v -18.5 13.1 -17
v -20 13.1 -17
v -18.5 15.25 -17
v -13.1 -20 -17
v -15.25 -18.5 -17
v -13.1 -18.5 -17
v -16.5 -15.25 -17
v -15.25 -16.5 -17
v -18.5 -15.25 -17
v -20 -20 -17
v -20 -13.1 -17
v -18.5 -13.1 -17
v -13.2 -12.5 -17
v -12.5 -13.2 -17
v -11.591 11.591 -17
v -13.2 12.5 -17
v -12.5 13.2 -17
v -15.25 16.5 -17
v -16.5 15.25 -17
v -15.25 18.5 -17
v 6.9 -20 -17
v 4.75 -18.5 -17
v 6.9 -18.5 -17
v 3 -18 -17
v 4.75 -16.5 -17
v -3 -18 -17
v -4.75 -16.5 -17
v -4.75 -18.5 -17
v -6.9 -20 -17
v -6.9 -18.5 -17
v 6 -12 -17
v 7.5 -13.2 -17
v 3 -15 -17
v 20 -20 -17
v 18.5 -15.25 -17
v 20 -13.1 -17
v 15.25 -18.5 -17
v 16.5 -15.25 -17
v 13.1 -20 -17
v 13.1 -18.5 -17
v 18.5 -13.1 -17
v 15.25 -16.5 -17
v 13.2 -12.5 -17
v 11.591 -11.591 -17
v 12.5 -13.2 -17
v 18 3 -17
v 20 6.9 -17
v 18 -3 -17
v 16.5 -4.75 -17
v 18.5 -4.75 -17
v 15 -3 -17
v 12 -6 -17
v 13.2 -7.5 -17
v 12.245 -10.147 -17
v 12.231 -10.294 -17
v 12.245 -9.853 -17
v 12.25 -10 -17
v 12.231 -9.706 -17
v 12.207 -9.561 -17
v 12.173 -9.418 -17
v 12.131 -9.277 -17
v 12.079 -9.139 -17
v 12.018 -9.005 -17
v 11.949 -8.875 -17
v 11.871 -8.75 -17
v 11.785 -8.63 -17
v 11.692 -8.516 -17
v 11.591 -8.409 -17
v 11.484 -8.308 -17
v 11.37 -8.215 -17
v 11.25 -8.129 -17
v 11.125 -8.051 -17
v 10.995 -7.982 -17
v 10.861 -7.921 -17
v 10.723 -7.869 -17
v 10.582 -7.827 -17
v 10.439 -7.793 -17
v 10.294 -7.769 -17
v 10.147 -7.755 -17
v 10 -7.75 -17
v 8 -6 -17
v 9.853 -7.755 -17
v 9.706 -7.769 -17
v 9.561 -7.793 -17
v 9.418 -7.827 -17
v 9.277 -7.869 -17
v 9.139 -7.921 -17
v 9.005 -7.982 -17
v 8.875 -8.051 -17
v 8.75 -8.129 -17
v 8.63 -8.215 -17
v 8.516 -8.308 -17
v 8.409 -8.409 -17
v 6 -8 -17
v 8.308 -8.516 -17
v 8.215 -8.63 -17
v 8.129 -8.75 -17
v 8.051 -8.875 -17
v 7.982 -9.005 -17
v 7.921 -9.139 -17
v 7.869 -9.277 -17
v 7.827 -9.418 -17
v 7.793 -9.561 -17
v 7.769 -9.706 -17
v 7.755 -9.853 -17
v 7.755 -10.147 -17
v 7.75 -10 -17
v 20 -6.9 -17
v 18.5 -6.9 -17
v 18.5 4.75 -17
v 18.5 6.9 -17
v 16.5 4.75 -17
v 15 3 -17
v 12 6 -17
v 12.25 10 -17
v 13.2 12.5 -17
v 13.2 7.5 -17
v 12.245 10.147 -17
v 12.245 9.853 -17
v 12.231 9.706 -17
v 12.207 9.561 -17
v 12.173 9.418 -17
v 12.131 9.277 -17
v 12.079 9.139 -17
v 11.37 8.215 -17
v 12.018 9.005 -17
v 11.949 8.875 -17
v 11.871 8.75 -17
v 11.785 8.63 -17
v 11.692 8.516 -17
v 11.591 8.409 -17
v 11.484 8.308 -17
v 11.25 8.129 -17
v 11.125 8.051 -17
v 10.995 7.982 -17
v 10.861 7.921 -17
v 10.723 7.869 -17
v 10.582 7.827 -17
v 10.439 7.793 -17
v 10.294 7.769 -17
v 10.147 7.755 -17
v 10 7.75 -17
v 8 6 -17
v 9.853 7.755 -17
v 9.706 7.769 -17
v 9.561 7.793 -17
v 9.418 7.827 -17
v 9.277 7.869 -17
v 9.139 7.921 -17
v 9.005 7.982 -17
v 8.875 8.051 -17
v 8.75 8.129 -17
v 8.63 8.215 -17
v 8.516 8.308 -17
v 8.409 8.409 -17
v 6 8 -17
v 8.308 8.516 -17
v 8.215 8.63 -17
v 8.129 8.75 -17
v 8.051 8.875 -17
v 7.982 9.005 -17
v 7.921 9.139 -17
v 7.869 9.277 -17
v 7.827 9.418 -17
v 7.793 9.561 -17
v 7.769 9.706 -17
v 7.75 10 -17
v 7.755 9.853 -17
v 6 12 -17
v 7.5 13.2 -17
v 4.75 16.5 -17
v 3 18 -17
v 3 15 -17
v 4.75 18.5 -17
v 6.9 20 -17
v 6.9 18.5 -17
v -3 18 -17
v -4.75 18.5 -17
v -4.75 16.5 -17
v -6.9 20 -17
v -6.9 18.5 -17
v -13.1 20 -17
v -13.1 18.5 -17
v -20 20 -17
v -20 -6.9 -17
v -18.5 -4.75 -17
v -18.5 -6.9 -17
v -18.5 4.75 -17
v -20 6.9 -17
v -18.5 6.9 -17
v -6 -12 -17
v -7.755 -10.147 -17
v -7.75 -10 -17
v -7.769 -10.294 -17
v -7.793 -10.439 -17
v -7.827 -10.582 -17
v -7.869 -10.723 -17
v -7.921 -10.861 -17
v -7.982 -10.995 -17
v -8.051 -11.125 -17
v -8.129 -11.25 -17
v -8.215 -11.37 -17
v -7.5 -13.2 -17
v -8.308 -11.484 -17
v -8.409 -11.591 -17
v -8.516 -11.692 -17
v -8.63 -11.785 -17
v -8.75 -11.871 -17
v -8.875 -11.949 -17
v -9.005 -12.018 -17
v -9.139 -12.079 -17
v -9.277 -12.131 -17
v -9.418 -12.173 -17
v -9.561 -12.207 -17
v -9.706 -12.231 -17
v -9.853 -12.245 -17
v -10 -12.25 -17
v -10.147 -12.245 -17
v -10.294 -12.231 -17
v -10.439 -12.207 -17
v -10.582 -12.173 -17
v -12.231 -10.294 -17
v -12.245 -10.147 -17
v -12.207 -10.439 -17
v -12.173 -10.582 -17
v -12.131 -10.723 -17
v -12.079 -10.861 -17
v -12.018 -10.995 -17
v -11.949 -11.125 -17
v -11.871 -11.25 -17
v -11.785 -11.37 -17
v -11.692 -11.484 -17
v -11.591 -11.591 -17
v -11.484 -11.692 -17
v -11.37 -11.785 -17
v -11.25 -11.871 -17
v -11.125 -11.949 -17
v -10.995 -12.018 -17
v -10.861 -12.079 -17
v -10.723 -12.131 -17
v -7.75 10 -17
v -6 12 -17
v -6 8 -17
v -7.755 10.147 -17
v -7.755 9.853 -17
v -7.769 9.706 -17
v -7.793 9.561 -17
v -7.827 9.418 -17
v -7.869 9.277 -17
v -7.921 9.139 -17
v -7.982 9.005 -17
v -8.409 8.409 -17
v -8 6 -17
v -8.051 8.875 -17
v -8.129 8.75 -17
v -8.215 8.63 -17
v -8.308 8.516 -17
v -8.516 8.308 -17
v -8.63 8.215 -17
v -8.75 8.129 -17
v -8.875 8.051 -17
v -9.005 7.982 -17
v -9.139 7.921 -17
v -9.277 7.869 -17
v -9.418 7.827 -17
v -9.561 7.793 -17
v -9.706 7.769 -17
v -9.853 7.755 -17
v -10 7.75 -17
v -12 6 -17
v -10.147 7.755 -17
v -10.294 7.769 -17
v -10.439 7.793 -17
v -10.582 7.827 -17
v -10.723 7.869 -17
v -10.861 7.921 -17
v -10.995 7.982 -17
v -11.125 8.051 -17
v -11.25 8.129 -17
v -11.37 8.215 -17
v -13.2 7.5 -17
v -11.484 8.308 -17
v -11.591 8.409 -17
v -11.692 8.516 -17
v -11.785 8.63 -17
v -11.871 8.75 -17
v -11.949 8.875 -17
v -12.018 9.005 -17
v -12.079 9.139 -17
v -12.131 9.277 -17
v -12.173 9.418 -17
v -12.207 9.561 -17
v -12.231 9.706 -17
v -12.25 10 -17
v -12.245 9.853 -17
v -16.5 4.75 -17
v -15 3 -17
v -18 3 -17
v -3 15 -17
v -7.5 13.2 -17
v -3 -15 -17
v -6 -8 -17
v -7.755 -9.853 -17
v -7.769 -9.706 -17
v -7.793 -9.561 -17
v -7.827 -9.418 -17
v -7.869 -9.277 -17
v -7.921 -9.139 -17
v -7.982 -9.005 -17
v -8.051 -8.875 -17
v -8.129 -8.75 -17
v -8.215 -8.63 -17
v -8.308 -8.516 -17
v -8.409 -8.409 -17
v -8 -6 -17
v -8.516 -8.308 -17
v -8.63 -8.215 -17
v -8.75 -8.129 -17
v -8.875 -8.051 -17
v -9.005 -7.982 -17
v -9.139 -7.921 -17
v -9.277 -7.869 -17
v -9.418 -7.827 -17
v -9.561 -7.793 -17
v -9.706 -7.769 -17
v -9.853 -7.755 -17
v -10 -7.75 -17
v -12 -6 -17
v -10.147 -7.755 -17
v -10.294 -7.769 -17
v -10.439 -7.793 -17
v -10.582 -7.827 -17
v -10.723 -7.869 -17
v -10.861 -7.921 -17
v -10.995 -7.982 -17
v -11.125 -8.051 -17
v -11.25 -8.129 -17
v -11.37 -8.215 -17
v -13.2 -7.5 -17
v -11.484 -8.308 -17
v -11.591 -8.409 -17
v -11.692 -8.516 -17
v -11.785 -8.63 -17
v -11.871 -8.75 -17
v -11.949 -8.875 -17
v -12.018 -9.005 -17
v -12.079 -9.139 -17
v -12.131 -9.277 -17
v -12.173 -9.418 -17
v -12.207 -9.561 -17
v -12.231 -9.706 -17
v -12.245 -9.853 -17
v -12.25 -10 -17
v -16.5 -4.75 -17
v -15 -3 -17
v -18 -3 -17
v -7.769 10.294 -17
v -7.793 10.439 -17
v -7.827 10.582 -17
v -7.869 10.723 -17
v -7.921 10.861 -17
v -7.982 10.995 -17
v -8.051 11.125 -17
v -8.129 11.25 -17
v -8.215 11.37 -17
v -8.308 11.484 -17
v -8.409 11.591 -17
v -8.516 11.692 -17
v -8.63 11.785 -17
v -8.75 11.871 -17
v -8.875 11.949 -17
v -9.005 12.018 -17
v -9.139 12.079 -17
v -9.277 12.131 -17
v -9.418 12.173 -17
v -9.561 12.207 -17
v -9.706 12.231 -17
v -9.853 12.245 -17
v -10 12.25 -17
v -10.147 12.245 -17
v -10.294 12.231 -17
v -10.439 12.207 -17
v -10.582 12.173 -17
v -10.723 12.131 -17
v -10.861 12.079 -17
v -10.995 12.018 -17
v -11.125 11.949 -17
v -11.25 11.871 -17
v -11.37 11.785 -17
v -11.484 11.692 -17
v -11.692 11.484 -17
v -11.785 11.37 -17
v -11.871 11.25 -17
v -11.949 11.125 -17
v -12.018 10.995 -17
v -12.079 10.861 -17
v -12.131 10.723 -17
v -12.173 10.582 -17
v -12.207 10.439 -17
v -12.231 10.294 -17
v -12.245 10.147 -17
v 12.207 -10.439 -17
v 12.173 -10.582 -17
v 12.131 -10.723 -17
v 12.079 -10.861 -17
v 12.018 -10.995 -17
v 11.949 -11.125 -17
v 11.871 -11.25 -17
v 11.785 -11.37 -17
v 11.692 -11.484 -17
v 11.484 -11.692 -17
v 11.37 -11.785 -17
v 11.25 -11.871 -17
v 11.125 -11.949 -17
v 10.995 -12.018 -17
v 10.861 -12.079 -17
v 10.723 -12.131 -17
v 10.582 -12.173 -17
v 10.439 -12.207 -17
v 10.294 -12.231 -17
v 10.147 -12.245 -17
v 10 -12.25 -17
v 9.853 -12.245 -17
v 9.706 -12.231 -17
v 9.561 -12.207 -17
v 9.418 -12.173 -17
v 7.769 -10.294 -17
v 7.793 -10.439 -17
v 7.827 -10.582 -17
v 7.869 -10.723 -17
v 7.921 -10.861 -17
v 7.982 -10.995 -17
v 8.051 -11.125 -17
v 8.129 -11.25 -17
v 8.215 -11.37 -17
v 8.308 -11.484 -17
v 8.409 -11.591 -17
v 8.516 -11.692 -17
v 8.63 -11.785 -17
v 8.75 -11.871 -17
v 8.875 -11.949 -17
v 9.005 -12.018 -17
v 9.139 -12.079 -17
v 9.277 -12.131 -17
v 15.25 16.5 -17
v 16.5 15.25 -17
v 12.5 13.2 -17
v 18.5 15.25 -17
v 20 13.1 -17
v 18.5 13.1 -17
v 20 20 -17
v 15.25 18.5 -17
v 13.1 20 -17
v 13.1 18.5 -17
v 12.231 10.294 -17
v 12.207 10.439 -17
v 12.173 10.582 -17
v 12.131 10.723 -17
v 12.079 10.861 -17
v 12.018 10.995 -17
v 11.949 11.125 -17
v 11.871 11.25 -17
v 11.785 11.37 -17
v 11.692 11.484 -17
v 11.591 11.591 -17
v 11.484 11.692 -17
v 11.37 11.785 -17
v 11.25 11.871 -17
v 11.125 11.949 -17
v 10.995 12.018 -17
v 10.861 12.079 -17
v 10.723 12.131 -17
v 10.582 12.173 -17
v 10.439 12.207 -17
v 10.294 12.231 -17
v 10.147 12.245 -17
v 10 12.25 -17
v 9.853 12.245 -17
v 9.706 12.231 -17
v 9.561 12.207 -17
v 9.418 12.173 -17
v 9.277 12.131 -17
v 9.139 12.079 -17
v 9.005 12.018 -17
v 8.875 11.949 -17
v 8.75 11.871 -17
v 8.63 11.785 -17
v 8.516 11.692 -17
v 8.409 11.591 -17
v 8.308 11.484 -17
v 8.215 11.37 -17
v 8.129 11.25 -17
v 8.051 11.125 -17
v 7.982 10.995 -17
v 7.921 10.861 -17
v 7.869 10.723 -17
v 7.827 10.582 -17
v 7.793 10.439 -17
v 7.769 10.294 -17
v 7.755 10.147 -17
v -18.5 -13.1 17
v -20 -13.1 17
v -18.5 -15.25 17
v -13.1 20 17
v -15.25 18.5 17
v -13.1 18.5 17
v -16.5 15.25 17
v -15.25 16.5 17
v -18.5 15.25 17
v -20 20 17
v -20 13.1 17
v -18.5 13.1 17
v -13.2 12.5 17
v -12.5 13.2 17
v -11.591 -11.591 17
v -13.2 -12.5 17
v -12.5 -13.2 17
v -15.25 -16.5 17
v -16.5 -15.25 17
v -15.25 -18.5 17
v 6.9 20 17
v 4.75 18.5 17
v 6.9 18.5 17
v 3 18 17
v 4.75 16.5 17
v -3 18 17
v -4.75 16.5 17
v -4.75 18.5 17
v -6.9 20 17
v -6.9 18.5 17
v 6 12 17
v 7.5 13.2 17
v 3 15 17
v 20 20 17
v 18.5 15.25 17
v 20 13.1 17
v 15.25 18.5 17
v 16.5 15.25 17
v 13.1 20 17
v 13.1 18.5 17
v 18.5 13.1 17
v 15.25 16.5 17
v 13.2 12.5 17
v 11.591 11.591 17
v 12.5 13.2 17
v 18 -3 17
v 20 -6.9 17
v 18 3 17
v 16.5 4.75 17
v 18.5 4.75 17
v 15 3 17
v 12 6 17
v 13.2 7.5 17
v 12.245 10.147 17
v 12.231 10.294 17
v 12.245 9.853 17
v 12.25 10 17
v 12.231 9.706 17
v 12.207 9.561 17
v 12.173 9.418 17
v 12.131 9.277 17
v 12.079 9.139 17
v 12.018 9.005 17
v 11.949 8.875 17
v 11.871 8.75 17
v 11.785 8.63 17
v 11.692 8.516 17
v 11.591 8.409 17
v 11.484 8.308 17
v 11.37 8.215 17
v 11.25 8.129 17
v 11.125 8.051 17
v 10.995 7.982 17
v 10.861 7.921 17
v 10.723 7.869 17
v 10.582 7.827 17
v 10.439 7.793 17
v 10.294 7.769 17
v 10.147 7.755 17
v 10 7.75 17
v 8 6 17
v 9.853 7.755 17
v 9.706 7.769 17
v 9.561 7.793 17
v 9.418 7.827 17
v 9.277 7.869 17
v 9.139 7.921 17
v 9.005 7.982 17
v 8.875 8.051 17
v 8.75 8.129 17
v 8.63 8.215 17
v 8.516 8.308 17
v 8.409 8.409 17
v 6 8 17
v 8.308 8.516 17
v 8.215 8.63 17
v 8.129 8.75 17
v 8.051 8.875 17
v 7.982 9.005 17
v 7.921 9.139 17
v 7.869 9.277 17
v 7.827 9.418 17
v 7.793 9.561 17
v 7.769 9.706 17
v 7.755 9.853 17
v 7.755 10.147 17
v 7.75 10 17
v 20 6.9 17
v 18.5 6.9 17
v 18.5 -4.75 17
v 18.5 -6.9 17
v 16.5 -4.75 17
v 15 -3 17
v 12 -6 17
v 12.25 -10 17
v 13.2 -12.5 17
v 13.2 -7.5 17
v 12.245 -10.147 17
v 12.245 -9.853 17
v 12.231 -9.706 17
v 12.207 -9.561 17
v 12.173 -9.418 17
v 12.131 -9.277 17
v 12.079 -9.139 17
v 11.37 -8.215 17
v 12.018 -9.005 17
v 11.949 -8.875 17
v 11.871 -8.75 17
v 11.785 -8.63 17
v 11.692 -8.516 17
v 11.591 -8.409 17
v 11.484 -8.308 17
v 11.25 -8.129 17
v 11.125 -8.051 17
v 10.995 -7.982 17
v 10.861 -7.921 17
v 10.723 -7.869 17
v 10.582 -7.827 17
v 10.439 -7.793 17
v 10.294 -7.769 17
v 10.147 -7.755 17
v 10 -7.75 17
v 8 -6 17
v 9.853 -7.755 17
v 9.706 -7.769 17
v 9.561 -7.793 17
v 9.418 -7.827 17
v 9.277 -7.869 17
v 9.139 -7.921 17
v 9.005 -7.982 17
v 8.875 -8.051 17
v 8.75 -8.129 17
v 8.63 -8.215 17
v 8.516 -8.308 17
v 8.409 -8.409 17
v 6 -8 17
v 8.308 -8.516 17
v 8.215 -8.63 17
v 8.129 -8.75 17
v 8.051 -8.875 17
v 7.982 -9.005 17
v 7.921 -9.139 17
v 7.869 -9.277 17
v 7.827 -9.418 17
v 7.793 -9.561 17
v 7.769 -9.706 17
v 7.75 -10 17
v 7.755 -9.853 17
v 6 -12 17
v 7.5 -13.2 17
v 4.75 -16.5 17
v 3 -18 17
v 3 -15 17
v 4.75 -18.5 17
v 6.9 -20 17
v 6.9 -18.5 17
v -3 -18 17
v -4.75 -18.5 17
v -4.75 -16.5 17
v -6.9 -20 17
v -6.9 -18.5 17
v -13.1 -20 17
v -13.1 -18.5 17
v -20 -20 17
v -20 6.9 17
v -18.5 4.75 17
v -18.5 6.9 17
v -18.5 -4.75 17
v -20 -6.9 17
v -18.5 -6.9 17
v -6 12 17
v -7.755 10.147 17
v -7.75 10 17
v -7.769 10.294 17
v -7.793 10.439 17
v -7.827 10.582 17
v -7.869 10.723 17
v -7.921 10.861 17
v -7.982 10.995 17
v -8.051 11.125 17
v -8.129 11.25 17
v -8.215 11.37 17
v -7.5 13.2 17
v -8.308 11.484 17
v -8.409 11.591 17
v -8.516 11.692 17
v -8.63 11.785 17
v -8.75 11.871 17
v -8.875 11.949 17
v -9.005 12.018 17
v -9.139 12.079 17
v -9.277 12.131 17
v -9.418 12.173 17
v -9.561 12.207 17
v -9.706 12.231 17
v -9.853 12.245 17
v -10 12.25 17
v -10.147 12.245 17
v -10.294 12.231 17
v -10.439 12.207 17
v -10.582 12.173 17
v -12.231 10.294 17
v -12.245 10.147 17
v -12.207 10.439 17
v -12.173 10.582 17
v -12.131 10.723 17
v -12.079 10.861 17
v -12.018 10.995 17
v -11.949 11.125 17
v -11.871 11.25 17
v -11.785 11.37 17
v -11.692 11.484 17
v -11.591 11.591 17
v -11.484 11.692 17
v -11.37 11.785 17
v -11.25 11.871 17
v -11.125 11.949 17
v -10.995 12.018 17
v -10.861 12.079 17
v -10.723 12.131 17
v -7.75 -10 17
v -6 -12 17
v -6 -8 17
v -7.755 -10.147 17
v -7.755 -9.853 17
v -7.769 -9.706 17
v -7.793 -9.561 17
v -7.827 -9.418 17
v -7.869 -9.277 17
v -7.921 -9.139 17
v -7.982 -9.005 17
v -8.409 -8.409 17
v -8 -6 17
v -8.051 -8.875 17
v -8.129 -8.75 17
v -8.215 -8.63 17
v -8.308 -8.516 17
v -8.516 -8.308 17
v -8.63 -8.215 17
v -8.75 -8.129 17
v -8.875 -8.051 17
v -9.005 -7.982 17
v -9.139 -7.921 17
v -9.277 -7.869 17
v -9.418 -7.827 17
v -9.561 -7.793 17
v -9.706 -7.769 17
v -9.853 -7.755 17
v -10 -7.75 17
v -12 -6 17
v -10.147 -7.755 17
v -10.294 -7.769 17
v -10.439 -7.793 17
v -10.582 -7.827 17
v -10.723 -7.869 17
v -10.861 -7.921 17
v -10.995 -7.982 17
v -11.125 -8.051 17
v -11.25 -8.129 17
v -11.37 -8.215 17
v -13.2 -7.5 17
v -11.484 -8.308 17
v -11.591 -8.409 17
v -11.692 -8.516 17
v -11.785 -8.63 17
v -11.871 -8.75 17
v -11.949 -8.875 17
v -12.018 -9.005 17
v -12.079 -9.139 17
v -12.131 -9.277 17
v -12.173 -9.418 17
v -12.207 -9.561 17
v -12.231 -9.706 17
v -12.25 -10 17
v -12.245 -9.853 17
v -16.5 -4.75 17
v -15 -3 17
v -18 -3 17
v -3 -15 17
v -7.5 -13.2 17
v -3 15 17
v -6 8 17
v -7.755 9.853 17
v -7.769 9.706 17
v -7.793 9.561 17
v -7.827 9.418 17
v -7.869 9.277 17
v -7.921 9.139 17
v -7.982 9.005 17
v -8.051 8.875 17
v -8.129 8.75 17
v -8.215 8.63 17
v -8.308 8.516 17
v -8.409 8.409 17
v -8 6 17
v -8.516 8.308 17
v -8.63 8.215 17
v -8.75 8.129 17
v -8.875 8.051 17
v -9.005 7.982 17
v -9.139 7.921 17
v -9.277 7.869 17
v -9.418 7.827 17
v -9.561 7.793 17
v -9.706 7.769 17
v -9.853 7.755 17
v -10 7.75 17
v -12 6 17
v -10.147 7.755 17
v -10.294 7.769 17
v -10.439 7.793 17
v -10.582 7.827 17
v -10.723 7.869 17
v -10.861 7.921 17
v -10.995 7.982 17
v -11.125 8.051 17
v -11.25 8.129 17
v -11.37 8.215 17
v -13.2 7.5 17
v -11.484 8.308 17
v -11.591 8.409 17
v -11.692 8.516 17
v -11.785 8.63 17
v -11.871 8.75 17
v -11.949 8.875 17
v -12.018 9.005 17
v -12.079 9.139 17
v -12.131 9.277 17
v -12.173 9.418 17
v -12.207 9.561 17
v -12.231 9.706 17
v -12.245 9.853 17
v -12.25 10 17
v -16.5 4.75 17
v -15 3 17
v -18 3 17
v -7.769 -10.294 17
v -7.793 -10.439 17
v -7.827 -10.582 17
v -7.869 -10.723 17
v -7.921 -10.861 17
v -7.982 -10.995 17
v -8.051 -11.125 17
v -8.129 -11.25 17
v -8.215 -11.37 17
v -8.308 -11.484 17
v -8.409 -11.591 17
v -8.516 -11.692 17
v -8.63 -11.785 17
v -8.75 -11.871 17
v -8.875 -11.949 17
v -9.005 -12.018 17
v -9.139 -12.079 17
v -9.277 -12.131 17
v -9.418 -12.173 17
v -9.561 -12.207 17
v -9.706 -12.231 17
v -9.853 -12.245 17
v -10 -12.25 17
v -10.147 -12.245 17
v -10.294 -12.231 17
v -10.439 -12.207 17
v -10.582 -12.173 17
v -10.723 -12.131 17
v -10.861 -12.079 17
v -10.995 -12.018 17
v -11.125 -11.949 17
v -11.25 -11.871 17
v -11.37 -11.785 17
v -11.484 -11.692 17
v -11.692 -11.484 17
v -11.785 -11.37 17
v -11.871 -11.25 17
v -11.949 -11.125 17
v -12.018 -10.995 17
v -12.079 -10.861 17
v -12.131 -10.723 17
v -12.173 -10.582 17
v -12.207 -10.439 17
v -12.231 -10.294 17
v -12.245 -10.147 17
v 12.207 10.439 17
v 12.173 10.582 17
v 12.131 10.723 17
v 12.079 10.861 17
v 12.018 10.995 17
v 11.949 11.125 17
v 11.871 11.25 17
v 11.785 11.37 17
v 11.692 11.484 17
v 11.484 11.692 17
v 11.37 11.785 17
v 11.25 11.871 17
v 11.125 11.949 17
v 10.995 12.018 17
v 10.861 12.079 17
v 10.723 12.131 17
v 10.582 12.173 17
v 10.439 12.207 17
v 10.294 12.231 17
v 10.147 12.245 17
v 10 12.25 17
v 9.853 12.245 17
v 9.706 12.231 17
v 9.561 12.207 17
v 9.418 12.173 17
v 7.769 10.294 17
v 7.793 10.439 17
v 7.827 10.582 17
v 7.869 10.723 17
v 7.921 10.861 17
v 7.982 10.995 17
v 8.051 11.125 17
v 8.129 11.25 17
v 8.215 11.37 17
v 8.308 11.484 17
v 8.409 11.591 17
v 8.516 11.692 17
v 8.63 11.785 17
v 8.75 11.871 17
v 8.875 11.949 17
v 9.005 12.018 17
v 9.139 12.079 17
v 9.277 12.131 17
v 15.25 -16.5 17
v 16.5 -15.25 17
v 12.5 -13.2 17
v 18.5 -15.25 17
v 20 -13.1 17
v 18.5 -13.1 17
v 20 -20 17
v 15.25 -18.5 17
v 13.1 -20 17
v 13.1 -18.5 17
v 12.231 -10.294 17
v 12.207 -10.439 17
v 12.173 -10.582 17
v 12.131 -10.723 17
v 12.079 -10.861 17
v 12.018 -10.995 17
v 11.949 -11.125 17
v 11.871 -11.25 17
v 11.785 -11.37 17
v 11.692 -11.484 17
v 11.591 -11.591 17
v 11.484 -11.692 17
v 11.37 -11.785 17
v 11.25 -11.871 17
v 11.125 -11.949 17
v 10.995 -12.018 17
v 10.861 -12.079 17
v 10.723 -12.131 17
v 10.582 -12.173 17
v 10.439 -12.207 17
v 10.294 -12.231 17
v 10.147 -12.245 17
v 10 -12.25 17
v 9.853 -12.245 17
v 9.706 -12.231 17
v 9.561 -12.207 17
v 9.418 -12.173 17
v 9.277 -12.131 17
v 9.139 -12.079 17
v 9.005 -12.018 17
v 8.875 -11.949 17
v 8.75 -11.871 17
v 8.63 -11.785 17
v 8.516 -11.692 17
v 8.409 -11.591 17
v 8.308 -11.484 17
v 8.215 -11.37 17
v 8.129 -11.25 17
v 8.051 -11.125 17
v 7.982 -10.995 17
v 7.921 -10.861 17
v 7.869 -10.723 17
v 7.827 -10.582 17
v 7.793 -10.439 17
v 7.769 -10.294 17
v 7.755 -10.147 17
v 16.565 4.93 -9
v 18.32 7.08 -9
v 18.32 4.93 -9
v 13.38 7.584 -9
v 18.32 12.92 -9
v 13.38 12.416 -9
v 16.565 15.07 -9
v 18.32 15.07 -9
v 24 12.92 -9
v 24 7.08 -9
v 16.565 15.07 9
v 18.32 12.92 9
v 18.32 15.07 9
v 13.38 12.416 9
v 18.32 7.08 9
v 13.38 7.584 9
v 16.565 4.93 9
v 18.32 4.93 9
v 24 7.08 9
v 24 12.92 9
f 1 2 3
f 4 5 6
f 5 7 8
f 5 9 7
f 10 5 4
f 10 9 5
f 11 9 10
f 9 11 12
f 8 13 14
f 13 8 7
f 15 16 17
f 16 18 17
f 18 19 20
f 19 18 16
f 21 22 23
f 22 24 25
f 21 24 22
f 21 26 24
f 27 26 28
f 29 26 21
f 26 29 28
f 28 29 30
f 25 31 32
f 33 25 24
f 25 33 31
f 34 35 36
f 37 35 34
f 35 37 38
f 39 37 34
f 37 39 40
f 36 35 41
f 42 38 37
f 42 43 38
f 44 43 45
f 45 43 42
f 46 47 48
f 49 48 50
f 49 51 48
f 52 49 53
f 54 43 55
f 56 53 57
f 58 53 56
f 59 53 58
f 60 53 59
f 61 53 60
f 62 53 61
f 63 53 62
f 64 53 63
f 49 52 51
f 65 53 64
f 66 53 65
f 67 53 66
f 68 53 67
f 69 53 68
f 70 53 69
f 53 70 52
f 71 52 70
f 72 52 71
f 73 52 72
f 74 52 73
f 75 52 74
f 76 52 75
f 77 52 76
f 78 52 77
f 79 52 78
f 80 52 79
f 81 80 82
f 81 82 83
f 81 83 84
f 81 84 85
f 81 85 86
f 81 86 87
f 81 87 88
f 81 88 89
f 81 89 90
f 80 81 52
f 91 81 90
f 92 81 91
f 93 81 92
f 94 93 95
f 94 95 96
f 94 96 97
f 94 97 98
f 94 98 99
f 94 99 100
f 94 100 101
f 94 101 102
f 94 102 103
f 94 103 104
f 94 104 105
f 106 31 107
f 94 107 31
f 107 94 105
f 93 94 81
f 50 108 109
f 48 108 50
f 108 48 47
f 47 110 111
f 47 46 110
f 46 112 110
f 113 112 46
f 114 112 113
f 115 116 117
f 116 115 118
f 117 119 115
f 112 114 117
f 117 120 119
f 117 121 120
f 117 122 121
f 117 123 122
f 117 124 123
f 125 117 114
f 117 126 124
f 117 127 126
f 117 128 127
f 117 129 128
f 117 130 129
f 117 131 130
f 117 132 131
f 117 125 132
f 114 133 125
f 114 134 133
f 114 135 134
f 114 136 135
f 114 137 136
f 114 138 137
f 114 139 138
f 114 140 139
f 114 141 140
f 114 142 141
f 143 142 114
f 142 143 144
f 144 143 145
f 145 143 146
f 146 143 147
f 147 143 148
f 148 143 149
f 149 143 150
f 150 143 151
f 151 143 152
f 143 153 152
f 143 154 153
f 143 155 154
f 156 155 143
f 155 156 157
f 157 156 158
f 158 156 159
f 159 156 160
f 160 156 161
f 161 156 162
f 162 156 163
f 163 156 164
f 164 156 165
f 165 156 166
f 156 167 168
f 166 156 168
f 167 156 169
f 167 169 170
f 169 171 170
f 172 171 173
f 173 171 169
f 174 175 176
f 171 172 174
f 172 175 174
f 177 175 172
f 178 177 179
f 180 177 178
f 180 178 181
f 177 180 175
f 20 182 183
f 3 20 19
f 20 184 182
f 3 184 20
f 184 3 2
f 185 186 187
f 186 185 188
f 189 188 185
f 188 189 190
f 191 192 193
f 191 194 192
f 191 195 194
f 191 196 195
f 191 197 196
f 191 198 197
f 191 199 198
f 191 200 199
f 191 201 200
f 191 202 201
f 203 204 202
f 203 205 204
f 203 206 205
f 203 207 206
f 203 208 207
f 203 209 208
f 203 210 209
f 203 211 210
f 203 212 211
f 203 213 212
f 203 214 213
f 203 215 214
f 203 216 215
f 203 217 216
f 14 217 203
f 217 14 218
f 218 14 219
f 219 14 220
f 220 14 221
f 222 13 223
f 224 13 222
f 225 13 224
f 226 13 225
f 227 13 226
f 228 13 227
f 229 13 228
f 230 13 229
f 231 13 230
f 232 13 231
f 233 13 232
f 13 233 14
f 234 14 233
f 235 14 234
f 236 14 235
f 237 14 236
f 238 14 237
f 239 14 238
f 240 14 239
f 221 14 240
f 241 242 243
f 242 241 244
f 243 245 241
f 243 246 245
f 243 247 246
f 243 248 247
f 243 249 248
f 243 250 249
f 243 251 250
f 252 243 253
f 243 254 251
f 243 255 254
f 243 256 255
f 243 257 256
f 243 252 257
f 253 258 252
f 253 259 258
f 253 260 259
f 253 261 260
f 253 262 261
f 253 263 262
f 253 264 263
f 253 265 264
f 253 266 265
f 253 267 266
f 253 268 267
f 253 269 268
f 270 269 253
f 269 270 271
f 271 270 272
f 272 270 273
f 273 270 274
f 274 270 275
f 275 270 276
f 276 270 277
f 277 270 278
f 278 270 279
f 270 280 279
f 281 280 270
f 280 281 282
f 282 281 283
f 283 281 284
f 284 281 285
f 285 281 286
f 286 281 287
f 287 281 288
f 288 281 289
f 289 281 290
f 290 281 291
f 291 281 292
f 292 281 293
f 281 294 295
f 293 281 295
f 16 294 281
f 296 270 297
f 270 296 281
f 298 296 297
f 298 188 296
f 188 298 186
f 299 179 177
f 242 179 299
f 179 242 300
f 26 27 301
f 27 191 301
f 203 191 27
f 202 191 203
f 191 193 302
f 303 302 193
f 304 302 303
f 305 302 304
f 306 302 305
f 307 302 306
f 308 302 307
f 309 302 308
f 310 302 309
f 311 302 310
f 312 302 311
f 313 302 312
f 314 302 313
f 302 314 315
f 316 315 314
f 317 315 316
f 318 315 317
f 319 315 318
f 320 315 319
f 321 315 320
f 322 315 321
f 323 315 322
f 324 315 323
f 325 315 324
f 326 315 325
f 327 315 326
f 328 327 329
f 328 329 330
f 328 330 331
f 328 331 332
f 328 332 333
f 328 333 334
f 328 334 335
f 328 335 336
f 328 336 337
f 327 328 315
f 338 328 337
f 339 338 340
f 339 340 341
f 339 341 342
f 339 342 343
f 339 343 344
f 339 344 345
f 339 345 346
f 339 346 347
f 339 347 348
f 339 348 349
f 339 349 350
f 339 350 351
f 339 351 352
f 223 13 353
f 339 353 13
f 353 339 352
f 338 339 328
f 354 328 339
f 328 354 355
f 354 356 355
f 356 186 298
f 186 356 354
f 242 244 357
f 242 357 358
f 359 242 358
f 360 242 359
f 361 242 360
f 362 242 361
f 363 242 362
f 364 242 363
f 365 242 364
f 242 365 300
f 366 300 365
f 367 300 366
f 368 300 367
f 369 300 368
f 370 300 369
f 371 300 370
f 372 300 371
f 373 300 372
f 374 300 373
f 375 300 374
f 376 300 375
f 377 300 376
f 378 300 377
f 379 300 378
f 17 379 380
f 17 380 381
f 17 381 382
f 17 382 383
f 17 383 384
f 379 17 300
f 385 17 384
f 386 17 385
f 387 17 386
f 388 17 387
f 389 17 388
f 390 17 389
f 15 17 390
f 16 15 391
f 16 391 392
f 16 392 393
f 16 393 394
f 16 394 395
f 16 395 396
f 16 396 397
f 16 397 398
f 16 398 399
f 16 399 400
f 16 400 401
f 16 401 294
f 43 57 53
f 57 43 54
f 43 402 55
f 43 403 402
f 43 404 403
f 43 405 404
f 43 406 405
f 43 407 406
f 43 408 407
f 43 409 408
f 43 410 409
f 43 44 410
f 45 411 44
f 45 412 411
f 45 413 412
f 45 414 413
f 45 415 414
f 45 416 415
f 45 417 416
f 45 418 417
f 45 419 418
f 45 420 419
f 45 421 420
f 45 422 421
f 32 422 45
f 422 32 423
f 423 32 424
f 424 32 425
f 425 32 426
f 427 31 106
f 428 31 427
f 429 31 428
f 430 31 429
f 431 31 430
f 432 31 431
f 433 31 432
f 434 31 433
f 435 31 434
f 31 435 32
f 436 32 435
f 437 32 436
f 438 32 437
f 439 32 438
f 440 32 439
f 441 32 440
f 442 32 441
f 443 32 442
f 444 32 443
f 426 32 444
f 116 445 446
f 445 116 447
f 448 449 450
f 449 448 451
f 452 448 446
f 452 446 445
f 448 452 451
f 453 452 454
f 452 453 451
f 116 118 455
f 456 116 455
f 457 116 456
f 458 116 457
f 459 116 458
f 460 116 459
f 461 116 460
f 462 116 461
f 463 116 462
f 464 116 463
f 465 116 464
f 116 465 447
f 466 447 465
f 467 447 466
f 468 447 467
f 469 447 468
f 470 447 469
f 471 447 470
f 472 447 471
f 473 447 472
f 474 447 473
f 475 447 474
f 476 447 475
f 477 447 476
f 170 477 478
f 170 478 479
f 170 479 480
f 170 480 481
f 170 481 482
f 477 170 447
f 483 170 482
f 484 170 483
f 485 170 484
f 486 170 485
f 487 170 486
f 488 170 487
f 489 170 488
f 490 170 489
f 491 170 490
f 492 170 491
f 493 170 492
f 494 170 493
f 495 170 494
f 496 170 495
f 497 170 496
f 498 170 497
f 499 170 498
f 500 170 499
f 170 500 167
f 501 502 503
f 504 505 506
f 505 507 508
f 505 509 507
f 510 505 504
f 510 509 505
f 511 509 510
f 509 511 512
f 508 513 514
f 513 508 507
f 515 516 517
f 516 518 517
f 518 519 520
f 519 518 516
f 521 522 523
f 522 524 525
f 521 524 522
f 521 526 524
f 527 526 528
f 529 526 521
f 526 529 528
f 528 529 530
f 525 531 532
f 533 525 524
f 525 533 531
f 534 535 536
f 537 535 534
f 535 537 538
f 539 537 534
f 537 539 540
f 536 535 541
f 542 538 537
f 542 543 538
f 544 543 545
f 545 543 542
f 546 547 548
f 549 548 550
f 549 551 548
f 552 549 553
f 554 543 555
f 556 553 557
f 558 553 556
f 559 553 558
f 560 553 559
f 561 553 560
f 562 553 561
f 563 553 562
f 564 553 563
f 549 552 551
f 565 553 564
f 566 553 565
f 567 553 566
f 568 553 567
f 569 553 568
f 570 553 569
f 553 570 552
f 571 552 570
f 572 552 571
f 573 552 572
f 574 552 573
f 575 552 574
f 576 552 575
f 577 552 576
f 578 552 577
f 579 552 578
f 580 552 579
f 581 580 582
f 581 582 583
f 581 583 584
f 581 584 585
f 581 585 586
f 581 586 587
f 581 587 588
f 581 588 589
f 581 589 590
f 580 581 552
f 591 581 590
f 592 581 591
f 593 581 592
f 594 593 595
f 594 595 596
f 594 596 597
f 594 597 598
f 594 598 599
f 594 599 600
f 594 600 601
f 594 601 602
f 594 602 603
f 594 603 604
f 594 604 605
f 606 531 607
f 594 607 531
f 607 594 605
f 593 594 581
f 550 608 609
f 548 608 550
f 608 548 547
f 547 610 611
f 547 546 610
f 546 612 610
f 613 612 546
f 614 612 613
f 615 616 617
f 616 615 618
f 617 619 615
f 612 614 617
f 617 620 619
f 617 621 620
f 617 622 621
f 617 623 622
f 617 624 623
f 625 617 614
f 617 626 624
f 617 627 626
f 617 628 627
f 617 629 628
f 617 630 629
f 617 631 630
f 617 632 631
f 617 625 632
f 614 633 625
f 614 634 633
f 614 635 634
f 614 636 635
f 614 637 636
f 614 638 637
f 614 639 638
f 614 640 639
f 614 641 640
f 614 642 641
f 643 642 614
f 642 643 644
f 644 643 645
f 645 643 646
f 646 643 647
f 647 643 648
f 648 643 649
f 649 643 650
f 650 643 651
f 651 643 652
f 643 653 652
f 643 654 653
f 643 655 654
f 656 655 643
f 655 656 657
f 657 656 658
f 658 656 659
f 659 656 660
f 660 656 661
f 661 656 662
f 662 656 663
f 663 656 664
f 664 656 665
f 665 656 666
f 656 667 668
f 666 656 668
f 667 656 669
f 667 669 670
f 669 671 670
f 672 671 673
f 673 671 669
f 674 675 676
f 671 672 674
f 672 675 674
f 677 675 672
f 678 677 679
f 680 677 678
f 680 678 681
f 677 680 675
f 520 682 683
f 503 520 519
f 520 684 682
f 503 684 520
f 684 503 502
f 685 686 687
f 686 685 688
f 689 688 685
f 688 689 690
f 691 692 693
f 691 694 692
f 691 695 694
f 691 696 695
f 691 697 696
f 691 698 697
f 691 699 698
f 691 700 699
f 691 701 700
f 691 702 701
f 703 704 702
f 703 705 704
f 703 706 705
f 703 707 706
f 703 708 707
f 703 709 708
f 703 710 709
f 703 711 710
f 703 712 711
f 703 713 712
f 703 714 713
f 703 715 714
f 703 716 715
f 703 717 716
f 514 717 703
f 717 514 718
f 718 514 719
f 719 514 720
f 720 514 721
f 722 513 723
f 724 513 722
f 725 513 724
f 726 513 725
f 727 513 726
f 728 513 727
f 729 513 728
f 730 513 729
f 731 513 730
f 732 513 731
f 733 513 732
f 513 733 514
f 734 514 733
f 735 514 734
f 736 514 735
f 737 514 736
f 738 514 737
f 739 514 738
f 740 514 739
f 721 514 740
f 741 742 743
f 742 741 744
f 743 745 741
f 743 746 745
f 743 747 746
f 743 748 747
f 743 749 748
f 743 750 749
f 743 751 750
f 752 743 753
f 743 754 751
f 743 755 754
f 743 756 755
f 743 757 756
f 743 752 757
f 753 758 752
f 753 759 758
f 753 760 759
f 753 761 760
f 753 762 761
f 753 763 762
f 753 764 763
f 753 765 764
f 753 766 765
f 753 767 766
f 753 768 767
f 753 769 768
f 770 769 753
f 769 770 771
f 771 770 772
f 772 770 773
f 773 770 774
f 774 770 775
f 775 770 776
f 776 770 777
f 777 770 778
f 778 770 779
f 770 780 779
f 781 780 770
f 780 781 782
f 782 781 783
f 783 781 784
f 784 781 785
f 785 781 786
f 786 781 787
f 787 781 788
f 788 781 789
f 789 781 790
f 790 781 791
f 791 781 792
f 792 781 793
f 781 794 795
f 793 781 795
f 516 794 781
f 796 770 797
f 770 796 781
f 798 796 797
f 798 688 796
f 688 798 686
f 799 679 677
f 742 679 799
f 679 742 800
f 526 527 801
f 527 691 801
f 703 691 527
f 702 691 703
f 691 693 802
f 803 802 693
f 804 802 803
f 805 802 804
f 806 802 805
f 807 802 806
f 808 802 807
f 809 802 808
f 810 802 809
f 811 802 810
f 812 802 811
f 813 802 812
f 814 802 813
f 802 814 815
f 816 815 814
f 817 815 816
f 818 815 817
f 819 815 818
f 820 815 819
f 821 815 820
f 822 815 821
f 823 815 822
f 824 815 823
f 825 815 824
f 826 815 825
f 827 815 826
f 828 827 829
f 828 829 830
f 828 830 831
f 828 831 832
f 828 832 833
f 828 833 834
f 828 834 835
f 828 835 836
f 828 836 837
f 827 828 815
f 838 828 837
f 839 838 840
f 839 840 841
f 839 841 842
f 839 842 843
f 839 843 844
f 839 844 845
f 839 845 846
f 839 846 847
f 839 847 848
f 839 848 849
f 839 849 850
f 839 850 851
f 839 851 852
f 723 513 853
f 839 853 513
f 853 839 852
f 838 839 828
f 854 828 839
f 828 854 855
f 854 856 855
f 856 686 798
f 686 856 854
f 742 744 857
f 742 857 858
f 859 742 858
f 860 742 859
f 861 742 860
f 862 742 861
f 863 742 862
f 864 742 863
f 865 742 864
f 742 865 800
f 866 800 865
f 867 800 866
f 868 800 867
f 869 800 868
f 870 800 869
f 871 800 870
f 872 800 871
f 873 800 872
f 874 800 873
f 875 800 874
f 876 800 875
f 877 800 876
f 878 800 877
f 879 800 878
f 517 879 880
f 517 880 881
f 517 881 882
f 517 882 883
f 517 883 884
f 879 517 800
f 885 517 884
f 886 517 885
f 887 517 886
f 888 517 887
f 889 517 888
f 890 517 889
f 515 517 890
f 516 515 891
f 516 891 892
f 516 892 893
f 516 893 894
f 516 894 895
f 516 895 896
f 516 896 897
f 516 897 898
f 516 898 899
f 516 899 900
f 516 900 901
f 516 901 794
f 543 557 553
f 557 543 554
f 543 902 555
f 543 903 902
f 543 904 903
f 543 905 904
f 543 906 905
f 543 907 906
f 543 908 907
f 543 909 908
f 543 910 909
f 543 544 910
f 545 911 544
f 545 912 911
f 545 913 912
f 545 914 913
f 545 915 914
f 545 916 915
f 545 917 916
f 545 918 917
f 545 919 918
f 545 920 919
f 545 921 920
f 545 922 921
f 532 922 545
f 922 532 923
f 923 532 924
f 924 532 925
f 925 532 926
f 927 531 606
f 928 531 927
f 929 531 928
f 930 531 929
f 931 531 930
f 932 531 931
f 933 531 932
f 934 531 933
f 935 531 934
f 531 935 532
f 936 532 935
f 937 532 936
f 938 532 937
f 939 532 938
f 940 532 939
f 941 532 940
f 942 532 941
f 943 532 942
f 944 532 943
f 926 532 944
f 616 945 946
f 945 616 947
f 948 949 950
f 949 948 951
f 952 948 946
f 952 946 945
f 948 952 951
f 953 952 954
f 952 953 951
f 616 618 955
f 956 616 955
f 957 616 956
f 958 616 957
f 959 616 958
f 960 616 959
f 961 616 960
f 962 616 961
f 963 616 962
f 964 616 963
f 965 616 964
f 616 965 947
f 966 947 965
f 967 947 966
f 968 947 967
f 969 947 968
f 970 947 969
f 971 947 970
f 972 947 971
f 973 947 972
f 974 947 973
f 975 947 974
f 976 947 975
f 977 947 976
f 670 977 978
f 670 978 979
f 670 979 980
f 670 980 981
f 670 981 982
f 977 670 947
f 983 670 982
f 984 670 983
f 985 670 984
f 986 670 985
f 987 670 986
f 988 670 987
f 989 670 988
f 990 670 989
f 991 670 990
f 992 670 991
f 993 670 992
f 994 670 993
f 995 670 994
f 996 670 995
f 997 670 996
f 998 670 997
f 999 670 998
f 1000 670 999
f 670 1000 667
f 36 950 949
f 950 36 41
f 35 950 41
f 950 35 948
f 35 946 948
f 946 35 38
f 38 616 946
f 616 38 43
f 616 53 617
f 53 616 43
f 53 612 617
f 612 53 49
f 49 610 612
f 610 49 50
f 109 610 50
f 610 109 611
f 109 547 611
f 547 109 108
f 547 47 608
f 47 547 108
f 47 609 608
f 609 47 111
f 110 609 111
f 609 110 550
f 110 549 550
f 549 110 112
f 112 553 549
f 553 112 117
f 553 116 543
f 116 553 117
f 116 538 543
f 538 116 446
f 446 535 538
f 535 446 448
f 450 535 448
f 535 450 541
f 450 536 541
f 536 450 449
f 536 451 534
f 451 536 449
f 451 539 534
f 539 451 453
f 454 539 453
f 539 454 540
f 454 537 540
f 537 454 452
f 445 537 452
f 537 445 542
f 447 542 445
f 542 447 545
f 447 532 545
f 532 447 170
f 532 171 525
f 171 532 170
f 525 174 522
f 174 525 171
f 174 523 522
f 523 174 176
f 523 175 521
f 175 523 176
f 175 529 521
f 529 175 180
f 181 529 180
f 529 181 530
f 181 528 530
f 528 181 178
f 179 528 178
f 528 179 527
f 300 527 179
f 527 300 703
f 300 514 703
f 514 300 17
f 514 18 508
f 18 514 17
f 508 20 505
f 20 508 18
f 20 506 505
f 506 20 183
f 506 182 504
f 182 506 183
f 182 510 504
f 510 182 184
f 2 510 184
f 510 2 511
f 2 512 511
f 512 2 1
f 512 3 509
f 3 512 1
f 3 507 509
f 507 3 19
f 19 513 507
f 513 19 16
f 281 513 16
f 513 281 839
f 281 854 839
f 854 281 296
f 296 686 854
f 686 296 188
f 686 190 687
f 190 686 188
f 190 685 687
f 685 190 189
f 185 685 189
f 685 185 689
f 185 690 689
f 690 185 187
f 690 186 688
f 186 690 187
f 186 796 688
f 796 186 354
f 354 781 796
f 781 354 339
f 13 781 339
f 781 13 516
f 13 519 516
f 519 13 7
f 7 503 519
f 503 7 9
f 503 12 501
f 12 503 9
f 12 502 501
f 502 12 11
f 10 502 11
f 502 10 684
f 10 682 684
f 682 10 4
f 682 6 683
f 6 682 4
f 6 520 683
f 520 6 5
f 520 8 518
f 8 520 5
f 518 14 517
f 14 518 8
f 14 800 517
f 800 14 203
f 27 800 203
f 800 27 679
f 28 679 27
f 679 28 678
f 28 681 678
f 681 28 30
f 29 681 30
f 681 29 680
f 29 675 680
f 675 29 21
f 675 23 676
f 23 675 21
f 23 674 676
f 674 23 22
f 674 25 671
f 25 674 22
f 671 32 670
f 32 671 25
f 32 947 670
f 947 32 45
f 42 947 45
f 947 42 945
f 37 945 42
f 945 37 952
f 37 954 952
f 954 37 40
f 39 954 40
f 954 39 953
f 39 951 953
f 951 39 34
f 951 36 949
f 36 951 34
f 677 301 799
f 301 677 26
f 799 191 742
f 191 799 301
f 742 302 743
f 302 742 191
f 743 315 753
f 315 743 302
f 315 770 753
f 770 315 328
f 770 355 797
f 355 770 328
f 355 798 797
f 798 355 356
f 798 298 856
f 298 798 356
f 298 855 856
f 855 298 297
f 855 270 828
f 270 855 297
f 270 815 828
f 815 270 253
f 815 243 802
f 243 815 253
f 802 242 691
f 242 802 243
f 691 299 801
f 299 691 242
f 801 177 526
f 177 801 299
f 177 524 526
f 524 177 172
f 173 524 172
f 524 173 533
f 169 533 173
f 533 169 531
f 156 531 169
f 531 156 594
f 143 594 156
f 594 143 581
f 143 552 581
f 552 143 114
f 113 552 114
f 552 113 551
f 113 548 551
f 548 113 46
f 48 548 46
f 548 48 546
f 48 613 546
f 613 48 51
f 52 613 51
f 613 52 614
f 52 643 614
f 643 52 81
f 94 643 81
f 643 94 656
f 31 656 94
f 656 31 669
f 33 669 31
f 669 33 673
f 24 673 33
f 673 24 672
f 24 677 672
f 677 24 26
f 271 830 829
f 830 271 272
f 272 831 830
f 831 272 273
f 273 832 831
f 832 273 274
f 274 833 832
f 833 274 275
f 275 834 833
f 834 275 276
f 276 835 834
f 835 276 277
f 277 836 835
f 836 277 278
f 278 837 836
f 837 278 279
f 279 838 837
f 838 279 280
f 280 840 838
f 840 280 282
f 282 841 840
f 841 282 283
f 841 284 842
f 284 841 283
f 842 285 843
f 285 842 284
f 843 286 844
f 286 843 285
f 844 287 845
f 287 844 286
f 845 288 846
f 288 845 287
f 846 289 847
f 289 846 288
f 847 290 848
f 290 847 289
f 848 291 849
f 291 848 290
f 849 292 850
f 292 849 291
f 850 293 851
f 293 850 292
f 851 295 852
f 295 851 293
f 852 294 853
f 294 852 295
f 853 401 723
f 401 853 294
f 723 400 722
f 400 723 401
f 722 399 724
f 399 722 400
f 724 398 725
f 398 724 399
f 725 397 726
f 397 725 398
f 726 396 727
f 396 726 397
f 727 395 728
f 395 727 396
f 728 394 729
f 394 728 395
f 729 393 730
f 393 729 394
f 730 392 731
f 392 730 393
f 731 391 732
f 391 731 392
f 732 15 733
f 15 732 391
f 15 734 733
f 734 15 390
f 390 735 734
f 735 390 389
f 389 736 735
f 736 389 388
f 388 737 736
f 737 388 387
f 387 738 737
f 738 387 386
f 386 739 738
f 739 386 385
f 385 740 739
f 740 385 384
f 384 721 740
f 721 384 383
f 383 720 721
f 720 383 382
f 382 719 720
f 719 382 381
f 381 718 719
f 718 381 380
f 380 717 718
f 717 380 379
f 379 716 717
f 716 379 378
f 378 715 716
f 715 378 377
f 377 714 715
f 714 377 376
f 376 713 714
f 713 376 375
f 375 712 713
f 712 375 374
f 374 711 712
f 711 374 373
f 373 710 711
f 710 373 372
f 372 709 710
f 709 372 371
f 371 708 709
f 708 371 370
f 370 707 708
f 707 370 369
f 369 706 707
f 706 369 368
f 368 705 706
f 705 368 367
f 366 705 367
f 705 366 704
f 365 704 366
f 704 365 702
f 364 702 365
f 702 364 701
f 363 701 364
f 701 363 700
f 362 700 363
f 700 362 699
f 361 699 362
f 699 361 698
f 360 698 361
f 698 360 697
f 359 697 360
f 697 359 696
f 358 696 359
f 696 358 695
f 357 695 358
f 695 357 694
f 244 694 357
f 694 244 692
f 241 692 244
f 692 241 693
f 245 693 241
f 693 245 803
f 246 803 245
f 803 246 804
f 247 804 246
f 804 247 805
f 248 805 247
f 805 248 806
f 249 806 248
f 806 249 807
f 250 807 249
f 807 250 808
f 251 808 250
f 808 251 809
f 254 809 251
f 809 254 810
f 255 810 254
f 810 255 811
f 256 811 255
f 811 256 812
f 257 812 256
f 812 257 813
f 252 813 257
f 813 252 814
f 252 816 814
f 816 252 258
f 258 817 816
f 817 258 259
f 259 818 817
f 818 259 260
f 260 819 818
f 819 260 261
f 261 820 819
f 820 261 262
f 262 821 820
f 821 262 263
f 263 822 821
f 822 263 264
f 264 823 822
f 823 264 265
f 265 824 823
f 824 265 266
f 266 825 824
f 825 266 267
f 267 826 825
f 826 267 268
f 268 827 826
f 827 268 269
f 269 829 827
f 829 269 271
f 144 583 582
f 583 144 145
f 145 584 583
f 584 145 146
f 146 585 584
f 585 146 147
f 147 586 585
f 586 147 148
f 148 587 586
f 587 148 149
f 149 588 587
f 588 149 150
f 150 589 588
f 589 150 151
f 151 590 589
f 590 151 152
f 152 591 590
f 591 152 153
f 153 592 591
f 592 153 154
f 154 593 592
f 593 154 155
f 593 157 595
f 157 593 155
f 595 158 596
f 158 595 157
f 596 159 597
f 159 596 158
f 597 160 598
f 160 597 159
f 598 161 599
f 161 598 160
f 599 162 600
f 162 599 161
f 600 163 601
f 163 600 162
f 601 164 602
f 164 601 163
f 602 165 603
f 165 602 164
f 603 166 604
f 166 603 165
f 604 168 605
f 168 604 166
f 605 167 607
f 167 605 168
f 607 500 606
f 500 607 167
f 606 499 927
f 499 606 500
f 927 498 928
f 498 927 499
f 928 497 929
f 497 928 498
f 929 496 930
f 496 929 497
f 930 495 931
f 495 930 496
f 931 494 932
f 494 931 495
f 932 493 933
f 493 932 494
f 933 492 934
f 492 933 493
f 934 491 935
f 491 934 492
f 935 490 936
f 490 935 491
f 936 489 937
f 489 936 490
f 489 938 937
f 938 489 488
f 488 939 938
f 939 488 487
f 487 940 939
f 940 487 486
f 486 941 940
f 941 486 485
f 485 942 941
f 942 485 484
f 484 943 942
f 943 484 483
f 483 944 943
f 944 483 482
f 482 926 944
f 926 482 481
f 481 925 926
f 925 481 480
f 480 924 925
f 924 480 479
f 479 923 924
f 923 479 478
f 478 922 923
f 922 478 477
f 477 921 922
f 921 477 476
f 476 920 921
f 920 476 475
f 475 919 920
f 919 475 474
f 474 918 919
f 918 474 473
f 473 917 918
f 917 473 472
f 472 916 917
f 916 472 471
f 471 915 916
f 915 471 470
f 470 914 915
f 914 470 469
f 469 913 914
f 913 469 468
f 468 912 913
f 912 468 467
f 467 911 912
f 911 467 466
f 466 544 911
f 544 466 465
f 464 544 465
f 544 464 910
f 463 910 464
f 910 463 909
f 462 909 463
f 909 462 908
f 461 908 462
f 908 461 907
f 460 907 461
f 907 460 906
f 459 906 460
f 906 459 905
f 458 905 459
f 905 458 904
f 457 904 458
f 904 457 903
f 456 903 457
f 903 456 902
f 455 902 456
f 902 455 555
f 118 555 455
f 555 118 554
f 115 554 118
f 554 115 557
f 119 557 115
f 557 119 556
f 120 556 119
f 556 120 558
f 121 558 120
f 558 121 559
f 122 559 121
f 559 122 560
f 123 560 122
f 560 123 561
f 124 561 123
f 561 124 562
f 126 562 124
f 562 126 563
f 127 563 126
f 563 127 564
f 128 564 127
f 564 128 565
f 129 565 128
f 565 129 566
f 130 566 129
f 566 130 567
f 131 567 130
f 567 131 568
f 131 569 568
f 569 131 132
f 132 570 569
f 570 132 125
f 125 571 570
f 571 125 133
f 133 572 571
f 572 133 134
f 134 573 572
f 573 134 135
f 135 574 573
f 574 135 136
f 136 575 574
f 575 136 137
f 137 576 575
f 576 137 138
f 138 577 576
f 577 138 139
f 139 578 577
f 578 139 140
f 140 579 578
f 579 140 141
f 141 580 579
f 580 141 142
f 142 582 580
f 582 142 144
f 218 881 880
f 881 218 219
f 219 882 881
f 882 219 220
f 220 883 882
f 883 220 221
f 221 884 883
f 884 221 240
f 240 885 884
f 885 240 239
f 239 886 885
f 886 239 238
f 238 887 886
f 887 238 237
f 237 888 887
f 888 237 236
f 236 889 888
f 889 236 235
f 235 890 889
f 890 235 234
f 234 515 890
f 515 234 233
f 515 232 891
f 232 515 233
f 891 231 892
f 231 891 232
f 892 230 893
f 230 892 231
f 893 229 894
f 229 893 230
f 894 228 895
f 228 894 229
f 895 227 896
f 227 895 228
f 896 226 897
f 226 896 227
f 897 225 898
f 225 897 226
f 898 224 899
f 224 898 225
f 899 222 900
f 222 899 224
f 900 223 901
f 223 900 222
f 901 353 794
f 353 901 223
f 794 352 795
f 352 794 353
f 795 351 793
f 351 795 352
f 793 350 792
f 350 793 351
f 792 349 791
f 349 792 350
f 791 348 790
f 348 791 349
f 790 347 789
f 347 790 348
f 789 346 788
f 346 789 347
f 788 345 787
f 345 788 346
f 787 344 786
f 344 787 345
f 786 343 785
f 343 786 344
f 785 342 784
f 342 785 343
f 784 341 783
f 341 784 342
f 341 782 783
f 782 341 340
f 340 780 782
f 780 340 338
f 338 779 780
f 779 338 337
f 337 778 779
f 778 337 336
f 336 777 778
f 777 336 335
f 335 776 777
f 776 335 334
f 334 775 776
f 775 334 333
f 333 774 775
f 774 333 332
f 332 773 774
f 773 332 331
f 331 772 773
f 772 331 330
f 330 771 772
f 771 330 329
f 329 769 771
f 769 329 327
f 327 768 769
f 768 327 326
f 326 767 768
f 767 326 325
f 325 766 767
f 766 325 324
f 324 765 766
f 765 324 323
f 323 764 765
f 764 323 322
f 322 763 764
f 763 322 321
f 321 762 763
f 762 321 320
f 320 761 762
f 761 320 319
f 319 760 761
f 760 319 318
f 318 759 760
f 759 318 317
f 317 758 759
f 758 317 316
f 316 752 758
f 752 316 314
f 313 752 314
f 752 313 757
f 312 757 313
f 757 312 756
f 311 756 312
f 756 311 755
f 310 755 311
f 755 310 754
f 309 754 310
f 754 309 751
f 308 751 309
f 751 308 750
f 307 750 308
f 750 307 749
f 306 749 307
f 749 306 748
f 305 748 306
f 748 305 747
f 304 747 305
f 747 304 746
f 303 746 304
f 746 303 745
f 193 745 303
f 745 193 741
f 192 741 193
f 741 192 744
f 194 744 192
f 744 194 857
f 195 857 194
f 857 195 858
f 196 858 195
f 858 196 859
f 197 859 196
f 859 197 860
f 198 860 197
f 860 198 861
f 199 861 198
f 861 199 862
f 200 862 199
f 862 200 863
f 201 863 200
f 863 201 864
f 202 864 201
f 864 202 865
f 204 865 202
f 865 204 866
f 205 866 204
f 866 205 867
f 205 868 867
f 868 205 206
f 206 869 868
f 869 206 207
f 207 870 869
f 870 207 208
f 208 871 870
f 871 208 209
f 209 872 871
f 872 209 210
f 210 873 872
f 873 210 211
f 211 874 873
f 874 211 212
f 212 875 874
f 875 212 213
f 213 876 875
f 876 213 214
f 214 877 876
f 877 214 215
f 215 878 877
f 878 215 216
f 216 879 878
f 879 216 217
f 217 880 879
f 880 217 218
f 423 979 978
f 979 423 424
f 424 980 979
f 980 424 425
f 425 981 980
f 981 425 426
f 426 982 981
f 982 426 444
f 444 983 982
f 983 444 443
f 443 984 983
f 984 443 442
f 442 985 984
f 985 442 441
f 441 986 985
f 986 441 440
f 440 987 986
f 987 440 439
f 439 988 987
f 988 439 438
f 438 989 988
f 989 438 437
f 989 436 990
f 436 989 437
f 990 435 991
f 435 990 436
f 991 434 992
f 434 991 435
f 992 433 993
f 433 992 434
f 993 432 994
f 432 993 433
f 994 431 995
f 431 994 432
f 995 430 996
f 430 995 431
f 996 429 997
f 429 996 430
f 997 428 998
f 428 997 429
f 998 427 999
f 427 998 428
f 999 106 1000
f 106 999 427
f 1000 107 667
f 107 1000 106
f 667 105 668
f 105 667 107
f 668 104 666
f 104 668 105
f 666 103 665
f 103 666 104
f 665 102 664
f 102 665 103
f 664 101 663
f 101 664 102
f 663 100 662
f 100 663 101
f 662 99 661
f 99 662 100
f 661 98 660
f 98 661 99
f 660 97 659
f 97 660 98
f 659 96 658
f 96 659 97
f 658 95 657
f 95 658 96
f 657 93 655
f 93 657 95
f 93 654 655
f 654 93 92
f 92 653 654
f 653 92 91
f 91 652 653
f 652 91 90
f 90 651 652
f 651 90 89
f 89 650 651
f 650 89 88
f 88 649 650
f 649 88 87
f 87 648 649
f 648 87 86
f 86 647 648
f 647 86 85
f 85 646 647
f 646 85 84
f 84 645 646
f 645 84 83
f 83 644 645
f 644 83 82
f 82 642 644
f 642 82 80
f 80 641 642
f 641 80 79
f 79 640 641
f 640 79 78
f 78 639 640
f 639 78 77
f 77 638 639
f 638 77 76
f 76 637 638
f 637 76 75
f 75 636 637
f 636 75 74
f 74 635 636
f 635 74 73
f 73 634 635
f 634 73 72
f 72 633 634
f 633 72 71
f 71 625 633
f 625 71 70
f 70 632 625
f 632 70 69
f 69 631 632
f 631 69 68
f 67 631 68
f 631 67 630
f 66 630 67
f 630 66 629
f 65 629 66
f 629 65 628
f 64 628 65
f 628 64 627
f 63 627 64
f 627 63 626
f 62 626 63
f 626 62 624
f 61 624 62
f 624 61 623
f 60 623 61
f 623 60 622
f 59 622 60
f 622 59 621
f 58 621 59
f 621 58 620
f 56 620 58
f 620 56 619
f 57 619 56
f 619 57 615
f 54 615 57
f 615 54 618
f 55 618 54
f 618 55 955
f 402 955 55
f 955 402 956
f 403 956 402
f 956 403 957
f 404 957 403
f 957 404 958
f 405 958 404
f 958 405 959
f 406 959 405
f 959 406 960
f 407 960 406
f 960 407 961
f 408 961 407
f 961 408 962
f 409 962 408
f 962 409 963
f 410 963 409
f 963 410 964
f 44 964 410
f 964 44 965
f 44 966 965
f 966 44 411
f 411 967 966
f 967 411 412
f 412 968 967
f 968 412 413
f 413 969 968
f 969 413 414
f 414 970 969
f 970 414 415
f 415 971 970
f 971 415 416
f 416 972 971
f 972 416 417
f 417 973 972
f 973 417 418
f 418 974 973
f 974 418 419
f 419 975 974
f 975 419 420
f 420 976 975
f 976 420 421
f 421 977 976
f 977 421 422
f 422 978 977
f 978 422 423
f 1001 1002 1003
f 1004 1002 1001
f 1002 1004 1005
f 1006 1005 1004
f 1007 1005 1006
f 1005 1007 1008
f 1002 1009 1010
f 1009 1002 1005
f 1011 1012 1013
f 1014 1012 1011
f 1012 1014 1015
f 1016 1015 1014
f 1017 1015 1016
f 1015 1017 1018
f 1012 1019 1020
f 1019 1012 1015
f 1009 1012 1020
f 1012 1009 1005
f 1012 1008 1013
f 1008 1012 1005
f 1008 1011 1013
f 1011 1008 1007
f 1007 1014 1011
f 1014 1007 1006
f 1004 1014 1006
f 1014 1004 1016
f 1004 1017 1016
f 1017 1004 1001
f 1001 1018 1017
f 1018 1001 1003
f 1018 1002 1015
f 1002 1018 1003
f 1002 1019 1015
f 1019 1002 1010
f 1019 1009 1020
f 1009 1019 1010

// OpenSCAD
// /cad/tslot/tslot_4040_interface.scad
// V3: right-hand outside-facing 4040 dual-slot reference + retained sliding key.
// Geometry is PARAMETRIC and PHOTO-DERIVED; NOT manufacturer-certified.
// File is self-contained. No BOSL2 or external library dependencies.
//
// Coordinate system: extrusion section XY, rail travel Z.
// RIGHT face lies at X=+20. Right-upper slot is centered at Y=+10.
// Local slot coordinate U is INWARD from that face (global X = 20-U).
// Local V is perpendicular to U, across the slot (global Y = 10-V).
// There are TWO 20-mm-pitch slots per face of the 40x40 body.
$fn = 96;

view = "assembly"; // assembly, section, exploded, key, rail, interference, void, key_section, rail_section

profile_size = 40;
slot_pitch = 20;
rail_length = 34;
key_length = 18;

// All dimensions in millimeters. PHOTO-DERIVED, not officially verified.
slot_mouth = 6.20;      // exterior throat, V opening
slot_head_height = 10.50;// widest region behind retaining lip
slot_inner_flat = 5.00; // rear vertical flat at deepest slot wall
slot_depth = 6.80;      // inward reach from exterior face
lip_depth = 1.50;       // U-depth of narrow mouth before step into undercut
head_flat_end = 3.50;   // U coordinate at start of rear chamfer

// Independent interface parameters:
slide_clearance = 0.18; // offset PER SURFACE on the male head
stem_protrusion = 4;    // outboard mounting tongue extends beyond face
stem_extra_overlap = 0.60;

// Reference-fixture-only dimensions (NOT verified production extrusion values):
core_hole_diameter = 4.5;
// Central void topology approximated from the photo (not verified to print).

assert(profile_size == 40 && slot_pitch==20,
       "This layout is specifically a 40x40 dual-20-mm-pitch section");
assert(slot_mouth > 0 && slot_head_height > slot_mouth);
assert(slot_inner_flat > 0 && slot_inner_flat < slot_head_height);
assert(slot_depth > head_flat_end && head_flat_end > lip_depth && lip_depth > 0);
assert(slide_clearance >= 0 && slide_clearance < min(lip_depth/2,slot_mouth/4));
assert(key_length < rail_length);

// The void has a REAL mechanical undercut: narrow opening from U=0 to
// U=lip_depth, wider chamber immediately behind lips, then CHAMFERED BACK WALL.
// Extend void 2 mm outside the metal so it cuts a continuous side opening.
function slot_void_vertices(overcut=2) = [
    [-overcut, -slot_mouth/2],
    [lip_depth, -slot_mouth/2],
    [lip_depth, -slot_head_height/2],
    [head_flat_end, -slot_head_height/2],
    [slot_depth, -slot_inner_flat/2],
    [slot_depth,  slot_inner_flat/2],
    [head_flat_end,  slot_head_height/2],
    [lip_depth,  slot_head_height/2],
    [lip_depth,  slot_mouth/2],
    [-overcut, slot_mouth/2]
];

module slot_void_local_2d(overcut=2) {
    polygon(slot_void_vertices(overcut));
}

module cavity_inside_local_2d() {
    intersection() {
        slot_void_local_2d(overcut=0);
        translate([0, -slot_head_height])
            square([slot_depth, 2*slot_head_height]);
    }
}

// Orientation intentionally explicit. Each slot opens OUTWARD on a side face.
module at_slot(face="right", position=10) {
    if(face == "right")
        translate([ profile_size/2, position]) rotate(180) children();
    else if(face == "left")
        translate([-profile_size/2, position]) children();
    else if(face == "top")
        translate([position, profile_size/2]) rotate(-90) children();
    else if(face == "bottom")
        translate([position, -profile_size/2]) rotate(90) children();
    else assert(false, "Invalid face");
}

// Full 40x40 reference section: 8 T-slots + 4 bores + central space.
// Only the SLOT CAVITY is parameterized from the photographed measurements;
// core holes / central diamond are deliberately reference-fixture approximations.
// Photo-inspired CENTRAL void. The thin closed exterior walls, broad cross,
// and four bores mimic the supplied photograph, but are NOT tolerance data.
module core_cross_void_2d() {
    polygon([
      [-3,18],[3,18],[3,15],[6,12],[6,8],
      [8,6],[12,6],[15,3],[18,3],
      [18,-3],[15,-3],[12,-6],[8,-6],[6,-8],[6,-12],
      [3,-15],[3,-18],[-3,-18],[-3,-15],[-6,-12],
      [-6,-8],[-8,-6],[-12,-6],[-15,-3],[-18,-3],
      [-18,3],[-15,3],[-12,6],[-8,6],[-6,8],[-6,12],[-3,15]
    ]);
}

module extrusion_4040_section_2d() {
    difference() {
        square([profile_size, profile_size], center=true);
        for (face=["right", "left", "top", "bottom"])
            for (position=[-slot_pitch/2,slot_pitch/2])
                at_slot(face,position) slot_void_local_2d();
        for(x=[-10,10]) for(y=[-10,10])
            translate([x,y]) circle(d=core_hole_diameter);
        core_cross_void_2d();
    }
}

// Male key head follows the *same* female cavity, with radial 2D clearance.
// The external stem remains narrower than the mouth and can join a bracket.
module sliding_key_local_2d() {
    union() {
        offset(delta=-slide_clearance) cavity_inside_local_2d();
        translate([-stem_protrusion, -(slot_mouth-2*slide_clearance)/2])
            square([stem_protrusion+lip_depth+stem_extra_overlap,
                    slot_mouth-2*slide_clearance]);
    }
}

module reference_rail_3d() {
    linear_extrude(height=rail_length, center=true, convexity=10)
        extrusion_4040_section_2d();
}
module fitted_key_3d() {
    linear_extrude(height=key_length, center=true, convexity=10)
        at_slot("right",10) sliding_key_local_2d();
}

// A tool-free 2D section is best for examining lip capture and the clearance.
// Use F5 preview for gray metal + orange key, and F6 to validate meshes.
if (view == "assembly") {
    color([0.66,0.72,0.78,0.25]) reference_rail_3d();
    color([1.00,0.45,0.03]) fitted_key_3d();
} else if (view == "section") {
    color([0.62,0.68,0.75]) extrusion_4040_section_2d();
    color([1.00,0.45,0.03]) at_slot("right",10) sliding_key_local_2d();
} else if (view == "exploded") {
    color([0.66,0.72,0.78,0.45]) reference_rail_3d();
    color([1.00,0.45,0.03]) translate([10,0,0]) fitted_key_3d();
} else if (view == "key") {
    color([1,0.45,0.03]) fitted_key_3d();
} else if (view == "rail") {
    reference_rail_3d();
} else if (view == "interference") {
    intersection() {
        reference_rail_3d();
        fitted_key_3d();
    }
} else if (view == "void") {
    at_slot("right",10) slot_void_local_2d(overcut=0);
} else if (view == "key_section") {
    at_slot("right",10) sliding_key_local_2d();
} else if (view == "rail_section") {
    extrusion_4040_section_2d();
} else assert(false, "Unknown view");
